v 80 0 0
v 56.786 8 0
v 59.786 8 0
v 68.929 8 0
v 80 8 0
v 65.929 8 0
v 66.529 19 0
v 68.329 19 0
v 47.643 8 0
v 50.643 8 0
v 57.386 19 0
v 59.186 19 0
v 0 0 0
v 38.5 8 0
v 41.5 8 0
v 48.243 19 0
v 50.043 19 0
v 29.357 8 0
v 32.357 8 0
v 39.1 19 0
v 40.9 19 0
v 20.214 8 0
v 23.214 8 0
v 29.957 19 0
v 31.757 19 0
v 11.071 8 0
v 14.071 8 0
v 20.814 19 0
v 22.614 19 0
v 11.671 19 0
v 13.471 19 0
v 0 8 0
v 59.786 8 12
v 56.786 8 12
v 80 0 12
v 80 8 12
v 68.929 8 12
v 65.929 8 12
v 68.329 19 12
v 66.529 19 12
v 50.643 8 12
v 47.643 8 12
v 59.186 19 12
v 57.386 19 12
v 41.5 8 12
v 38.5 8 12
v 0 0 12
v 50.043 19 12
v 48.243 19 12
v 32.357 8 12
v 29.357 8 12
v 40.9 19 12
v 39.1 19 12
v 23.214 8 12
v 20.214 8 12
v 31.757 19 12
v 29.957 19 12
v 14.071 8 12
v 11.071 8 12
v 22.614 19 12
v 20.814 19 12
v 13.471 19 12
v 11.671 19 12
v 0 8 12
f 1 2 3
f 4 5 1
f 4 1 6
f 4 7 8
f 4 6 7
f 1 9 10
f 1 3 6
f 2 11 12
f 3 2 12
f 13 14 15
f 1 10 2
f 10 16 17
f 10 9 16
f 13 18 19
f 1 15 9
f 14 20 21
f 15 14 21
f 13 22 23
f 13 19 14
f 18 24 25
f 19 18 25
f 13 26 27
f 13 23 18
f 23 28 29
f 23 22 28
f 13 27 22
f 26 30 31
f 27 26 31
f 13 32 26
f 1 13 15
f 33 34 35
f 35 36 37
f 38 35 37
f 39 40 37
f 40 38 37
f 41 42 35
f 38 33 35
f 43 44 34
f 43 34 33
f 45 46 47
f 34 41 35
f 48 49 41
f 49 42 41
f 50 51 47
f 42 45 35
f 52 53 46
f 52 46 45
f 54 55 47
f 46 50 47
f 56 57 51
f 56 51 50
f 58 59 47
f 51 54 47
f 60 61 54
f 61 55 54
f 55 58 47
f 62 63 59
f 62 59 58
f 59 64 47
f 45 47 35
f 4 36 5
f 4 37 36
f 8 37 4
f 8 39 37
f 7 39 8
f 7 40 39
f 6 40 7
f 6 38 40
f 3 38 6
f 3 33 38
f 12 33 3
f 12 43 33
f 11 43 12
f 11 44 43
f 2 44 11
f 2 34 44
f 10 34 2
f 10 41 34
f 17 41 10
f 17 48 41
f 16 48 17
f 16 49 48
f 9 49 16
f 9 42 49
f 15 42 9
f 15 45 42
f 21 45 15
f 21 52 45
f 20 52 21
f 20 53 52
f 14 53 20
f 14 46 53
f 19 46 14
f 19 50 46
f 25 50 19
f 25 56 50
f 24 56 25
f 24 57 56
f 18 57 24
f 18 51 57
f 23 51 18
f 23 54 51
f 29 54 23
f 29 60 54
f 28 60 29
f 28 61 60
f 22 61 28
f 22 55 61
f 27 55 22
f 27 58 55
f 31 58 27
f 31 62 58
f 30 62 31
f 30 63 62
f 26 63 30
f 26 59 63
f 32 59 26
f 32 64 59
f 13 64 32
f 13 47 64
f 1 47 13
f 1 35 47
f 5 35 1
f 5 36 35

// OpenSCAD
$fn = 32;

// ----------------------------------------------------------------------
// Gear rack: 7 teeth on a 80 mm bar, pitch 9.14 mm
// ----------------------------------------------------------------------

// --- parameters (mm) ---
profile_height = 12;      // extrusion height
profile_points = 32;      // points of the closed outline

profile = [[0, 0], [80, 0], [80, 8], [68.929, 8], [68.329, 19], [66.529, 19], [65.929, 8], [59.786, 8], [59.186, 19], [57.386, 19], [56.786, 8], [50.643, 8], [50.043, 19], [48.243, 19], [47.643, 8], [41.5, 8], [40.9, 19], [39.1, 19], [38.5, 8], [32.357, 8], [31.757, 19], [29.957, 19], [29.357, 8], [23.214, 8], [22.614, 19], [20.814, 19], [20.214, 8], [14.071, 8], [13.471, 19], [11.671, 19], [11.071, 8], [0, 8]];  // single closed polygon, 32 points, counter clockwise

// --- the one profile operation ---
linear_extrude(height = profile_height) polygon(points = profile);
